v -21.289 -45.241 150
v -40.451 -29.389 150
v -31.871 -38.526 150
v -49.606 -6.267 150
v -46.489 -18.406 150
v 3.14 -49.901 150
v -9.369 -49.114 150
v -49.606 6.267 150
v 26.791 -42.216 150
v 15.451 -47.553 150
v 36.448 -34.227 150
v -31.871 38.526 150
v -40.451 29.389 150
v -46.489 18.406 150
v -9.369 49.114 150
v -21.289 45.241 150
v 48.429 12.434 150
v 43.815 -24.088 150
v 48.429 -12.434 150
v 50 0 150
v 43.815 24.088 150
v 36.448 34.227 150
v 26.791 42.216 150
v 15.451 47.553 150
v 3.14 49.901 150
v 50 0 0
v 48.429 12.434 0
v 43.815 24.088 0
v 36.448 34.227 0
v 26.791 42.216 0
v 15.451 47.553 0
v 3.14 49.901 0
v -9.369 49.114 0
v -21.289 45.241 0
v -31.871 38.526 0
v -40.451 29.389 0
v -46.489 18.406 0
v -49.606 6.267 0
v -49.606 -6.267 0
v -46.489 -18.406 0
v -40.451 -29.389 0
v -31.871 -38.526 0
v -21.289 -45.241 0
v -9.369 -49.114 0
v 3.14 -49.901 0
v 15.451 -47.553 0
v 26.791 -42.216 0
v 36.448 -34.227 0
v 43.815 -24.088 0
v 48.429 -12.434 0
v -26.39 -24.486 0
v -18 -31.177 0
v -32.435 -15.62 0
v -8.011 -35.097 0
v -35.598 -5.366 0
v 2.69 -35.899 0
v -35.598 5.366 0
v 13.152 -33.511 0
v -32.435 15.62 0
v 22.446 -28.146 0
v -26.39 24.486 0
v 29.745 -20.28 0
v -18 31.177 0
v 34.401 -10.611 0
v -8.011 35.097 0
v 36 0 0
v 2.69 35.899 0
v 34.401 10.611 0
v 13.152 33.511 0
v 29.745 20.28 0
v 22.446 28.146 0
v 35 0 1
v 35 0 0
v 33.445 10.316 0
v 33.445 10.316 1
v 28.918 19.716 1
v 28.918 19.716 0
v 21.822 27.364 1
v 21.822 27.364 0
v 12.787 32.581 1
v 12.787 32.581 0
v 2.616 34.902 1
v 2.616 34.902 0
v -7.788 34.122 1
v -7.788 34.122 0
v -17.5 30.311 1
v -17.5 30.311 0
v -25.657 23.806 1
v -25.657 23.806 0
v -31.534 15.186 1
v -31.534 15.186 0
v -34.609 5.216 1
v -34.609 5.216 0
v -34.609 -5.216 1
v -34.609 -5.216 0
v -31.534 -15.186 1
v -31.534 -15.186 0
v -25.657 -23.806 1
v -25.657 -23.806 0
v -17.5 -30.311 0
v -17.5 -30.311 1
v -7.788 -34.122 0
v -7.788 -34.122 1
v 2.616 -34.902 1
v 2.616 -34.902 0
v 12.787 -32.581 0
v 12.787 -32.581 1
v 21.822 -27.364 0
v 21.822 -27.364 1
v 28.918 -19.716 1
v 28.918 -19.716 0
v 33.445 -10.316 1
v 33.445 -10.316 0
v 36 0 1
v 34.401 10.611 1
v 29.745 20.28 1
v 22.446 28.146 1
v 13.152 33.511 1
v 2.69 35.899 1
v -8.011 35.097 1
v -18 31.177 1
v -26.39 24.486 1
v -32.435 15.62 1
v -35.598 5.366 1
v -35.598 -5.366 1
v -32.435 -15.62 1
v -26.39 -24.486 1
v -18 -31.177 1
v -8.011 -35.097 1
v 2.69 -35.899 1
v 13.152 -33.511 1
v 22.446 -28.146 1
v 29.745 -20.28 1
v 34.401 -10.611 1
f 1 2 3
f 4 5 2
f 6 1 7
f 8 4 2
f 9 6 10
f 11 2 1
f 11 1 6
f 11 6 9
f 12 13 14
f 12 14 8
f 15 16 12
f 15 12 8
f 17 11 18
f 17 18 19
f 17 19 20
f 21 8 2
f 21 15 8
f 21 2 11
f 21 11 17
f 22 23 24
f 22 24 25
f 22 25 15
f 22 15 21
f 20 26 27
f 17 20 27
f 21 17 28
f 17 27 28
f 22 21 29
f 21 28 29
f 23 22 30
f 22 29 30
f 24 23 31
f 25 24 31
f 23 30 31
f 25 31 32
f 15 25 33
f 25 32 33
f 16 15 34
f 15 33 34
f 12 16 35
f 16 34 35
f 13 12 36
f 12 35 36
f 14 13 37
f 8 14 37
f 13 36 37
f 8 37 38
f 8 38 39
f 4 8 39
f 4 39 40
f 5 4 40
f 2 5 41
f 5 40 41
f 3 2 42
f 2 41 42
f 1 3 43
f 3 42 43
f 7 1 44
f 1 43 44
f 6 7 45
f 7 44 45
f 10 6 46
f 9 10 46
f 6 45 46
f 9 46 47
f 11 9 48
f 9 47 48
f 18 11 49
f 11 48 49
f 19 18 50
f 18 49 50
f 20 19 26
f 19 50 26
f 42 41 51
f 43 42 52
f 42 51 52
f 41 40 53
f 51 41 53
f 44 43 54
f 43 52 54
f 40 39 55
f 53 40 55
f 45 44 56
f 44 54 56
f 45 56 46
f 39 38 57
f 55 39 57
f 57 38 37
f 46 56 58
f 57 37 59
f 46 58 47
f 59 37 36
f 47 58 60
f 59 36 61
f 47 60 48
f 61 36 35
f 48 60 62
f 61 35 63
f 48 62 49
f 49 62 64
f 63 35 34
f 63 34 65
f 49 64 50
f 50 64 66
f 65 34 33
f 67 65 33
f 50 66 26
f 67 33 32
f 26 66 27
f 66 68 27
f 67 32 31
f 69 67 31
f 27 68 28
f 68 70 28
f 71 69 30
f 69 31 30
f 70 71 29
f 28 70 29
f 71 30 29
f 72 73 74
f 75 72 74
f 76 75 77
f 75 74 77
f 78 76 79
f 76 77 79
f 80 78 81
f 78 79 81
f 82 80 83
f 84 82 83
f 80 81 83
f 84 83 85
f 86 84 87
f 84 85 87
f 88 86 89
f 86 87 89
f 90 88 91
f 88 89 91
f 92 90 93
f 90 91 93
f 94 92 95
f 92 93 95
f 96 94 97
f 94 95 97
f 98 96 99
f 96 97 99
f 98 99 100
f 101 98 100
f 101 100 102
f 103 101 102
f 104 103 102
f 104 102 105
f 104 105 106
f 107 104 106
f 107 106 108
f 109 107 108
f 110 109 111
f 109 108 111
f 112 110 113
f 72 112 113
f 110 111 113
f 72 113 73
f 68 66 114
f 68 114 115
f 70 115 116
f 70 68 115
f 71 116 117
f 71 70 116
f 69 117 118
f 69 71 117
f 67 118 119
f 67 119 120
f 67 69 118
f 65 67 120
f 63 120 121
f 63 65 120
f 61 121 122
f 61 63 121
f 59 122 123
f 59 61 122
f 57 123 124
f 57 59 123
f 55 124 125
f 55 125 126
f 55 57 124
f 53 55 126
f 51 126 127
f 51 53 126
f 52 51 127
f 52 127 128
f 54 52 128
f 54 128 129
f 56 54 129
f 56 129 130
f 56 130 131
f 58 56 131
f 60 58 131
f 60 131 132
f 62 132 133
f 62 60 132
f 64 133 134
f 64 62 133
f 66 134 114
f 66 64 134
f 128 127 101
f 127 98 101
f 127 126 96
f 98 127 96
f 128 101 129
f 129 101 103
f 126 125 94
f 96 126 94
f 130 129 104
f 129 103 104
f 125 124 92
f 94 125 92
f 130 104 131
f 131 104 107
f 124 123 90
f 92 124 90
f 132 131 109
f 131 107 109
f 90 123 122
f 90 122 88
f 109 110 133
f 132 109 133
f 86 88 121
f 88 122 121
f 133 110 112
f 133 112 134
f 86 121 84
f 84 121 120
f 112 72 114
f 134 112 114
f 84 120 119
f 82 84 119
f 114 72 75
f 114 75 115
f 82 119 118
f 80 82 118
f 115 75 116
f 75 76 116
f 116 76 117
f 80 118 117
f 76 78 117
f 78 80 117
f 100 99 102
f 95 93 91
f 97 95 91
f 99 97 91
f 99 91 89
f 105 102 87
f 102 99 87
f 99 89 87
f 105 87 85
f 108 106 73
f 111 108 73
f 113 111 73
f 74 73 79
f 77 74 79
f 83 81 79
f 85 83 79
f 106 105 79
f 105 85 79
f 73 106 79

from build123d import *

# Parameters (mm, degrees)
F2_R     = 50
F3_DEPTH = 150
F4_R     = 36
F4_R_2   = 35
F5_DEPTH = 1


with BuildPart() as f3:
    # F2 (on Top) → F3 (new body)
    with BuildSketch(Plane.XY):
        Circle(F2_R)
    extrude(amount=F3_DEPTH)

    # F4 (on Top) → F5 (cut)
    with BuildSketch(Plane.XY):
        Circle(F4_R)
        Circle(F4_R_2, mode=Mode.SUBTRACT)
    extrude(amount=F5_DEPTH, mode=Mode.SUBTRACT)


solid = f3.part
